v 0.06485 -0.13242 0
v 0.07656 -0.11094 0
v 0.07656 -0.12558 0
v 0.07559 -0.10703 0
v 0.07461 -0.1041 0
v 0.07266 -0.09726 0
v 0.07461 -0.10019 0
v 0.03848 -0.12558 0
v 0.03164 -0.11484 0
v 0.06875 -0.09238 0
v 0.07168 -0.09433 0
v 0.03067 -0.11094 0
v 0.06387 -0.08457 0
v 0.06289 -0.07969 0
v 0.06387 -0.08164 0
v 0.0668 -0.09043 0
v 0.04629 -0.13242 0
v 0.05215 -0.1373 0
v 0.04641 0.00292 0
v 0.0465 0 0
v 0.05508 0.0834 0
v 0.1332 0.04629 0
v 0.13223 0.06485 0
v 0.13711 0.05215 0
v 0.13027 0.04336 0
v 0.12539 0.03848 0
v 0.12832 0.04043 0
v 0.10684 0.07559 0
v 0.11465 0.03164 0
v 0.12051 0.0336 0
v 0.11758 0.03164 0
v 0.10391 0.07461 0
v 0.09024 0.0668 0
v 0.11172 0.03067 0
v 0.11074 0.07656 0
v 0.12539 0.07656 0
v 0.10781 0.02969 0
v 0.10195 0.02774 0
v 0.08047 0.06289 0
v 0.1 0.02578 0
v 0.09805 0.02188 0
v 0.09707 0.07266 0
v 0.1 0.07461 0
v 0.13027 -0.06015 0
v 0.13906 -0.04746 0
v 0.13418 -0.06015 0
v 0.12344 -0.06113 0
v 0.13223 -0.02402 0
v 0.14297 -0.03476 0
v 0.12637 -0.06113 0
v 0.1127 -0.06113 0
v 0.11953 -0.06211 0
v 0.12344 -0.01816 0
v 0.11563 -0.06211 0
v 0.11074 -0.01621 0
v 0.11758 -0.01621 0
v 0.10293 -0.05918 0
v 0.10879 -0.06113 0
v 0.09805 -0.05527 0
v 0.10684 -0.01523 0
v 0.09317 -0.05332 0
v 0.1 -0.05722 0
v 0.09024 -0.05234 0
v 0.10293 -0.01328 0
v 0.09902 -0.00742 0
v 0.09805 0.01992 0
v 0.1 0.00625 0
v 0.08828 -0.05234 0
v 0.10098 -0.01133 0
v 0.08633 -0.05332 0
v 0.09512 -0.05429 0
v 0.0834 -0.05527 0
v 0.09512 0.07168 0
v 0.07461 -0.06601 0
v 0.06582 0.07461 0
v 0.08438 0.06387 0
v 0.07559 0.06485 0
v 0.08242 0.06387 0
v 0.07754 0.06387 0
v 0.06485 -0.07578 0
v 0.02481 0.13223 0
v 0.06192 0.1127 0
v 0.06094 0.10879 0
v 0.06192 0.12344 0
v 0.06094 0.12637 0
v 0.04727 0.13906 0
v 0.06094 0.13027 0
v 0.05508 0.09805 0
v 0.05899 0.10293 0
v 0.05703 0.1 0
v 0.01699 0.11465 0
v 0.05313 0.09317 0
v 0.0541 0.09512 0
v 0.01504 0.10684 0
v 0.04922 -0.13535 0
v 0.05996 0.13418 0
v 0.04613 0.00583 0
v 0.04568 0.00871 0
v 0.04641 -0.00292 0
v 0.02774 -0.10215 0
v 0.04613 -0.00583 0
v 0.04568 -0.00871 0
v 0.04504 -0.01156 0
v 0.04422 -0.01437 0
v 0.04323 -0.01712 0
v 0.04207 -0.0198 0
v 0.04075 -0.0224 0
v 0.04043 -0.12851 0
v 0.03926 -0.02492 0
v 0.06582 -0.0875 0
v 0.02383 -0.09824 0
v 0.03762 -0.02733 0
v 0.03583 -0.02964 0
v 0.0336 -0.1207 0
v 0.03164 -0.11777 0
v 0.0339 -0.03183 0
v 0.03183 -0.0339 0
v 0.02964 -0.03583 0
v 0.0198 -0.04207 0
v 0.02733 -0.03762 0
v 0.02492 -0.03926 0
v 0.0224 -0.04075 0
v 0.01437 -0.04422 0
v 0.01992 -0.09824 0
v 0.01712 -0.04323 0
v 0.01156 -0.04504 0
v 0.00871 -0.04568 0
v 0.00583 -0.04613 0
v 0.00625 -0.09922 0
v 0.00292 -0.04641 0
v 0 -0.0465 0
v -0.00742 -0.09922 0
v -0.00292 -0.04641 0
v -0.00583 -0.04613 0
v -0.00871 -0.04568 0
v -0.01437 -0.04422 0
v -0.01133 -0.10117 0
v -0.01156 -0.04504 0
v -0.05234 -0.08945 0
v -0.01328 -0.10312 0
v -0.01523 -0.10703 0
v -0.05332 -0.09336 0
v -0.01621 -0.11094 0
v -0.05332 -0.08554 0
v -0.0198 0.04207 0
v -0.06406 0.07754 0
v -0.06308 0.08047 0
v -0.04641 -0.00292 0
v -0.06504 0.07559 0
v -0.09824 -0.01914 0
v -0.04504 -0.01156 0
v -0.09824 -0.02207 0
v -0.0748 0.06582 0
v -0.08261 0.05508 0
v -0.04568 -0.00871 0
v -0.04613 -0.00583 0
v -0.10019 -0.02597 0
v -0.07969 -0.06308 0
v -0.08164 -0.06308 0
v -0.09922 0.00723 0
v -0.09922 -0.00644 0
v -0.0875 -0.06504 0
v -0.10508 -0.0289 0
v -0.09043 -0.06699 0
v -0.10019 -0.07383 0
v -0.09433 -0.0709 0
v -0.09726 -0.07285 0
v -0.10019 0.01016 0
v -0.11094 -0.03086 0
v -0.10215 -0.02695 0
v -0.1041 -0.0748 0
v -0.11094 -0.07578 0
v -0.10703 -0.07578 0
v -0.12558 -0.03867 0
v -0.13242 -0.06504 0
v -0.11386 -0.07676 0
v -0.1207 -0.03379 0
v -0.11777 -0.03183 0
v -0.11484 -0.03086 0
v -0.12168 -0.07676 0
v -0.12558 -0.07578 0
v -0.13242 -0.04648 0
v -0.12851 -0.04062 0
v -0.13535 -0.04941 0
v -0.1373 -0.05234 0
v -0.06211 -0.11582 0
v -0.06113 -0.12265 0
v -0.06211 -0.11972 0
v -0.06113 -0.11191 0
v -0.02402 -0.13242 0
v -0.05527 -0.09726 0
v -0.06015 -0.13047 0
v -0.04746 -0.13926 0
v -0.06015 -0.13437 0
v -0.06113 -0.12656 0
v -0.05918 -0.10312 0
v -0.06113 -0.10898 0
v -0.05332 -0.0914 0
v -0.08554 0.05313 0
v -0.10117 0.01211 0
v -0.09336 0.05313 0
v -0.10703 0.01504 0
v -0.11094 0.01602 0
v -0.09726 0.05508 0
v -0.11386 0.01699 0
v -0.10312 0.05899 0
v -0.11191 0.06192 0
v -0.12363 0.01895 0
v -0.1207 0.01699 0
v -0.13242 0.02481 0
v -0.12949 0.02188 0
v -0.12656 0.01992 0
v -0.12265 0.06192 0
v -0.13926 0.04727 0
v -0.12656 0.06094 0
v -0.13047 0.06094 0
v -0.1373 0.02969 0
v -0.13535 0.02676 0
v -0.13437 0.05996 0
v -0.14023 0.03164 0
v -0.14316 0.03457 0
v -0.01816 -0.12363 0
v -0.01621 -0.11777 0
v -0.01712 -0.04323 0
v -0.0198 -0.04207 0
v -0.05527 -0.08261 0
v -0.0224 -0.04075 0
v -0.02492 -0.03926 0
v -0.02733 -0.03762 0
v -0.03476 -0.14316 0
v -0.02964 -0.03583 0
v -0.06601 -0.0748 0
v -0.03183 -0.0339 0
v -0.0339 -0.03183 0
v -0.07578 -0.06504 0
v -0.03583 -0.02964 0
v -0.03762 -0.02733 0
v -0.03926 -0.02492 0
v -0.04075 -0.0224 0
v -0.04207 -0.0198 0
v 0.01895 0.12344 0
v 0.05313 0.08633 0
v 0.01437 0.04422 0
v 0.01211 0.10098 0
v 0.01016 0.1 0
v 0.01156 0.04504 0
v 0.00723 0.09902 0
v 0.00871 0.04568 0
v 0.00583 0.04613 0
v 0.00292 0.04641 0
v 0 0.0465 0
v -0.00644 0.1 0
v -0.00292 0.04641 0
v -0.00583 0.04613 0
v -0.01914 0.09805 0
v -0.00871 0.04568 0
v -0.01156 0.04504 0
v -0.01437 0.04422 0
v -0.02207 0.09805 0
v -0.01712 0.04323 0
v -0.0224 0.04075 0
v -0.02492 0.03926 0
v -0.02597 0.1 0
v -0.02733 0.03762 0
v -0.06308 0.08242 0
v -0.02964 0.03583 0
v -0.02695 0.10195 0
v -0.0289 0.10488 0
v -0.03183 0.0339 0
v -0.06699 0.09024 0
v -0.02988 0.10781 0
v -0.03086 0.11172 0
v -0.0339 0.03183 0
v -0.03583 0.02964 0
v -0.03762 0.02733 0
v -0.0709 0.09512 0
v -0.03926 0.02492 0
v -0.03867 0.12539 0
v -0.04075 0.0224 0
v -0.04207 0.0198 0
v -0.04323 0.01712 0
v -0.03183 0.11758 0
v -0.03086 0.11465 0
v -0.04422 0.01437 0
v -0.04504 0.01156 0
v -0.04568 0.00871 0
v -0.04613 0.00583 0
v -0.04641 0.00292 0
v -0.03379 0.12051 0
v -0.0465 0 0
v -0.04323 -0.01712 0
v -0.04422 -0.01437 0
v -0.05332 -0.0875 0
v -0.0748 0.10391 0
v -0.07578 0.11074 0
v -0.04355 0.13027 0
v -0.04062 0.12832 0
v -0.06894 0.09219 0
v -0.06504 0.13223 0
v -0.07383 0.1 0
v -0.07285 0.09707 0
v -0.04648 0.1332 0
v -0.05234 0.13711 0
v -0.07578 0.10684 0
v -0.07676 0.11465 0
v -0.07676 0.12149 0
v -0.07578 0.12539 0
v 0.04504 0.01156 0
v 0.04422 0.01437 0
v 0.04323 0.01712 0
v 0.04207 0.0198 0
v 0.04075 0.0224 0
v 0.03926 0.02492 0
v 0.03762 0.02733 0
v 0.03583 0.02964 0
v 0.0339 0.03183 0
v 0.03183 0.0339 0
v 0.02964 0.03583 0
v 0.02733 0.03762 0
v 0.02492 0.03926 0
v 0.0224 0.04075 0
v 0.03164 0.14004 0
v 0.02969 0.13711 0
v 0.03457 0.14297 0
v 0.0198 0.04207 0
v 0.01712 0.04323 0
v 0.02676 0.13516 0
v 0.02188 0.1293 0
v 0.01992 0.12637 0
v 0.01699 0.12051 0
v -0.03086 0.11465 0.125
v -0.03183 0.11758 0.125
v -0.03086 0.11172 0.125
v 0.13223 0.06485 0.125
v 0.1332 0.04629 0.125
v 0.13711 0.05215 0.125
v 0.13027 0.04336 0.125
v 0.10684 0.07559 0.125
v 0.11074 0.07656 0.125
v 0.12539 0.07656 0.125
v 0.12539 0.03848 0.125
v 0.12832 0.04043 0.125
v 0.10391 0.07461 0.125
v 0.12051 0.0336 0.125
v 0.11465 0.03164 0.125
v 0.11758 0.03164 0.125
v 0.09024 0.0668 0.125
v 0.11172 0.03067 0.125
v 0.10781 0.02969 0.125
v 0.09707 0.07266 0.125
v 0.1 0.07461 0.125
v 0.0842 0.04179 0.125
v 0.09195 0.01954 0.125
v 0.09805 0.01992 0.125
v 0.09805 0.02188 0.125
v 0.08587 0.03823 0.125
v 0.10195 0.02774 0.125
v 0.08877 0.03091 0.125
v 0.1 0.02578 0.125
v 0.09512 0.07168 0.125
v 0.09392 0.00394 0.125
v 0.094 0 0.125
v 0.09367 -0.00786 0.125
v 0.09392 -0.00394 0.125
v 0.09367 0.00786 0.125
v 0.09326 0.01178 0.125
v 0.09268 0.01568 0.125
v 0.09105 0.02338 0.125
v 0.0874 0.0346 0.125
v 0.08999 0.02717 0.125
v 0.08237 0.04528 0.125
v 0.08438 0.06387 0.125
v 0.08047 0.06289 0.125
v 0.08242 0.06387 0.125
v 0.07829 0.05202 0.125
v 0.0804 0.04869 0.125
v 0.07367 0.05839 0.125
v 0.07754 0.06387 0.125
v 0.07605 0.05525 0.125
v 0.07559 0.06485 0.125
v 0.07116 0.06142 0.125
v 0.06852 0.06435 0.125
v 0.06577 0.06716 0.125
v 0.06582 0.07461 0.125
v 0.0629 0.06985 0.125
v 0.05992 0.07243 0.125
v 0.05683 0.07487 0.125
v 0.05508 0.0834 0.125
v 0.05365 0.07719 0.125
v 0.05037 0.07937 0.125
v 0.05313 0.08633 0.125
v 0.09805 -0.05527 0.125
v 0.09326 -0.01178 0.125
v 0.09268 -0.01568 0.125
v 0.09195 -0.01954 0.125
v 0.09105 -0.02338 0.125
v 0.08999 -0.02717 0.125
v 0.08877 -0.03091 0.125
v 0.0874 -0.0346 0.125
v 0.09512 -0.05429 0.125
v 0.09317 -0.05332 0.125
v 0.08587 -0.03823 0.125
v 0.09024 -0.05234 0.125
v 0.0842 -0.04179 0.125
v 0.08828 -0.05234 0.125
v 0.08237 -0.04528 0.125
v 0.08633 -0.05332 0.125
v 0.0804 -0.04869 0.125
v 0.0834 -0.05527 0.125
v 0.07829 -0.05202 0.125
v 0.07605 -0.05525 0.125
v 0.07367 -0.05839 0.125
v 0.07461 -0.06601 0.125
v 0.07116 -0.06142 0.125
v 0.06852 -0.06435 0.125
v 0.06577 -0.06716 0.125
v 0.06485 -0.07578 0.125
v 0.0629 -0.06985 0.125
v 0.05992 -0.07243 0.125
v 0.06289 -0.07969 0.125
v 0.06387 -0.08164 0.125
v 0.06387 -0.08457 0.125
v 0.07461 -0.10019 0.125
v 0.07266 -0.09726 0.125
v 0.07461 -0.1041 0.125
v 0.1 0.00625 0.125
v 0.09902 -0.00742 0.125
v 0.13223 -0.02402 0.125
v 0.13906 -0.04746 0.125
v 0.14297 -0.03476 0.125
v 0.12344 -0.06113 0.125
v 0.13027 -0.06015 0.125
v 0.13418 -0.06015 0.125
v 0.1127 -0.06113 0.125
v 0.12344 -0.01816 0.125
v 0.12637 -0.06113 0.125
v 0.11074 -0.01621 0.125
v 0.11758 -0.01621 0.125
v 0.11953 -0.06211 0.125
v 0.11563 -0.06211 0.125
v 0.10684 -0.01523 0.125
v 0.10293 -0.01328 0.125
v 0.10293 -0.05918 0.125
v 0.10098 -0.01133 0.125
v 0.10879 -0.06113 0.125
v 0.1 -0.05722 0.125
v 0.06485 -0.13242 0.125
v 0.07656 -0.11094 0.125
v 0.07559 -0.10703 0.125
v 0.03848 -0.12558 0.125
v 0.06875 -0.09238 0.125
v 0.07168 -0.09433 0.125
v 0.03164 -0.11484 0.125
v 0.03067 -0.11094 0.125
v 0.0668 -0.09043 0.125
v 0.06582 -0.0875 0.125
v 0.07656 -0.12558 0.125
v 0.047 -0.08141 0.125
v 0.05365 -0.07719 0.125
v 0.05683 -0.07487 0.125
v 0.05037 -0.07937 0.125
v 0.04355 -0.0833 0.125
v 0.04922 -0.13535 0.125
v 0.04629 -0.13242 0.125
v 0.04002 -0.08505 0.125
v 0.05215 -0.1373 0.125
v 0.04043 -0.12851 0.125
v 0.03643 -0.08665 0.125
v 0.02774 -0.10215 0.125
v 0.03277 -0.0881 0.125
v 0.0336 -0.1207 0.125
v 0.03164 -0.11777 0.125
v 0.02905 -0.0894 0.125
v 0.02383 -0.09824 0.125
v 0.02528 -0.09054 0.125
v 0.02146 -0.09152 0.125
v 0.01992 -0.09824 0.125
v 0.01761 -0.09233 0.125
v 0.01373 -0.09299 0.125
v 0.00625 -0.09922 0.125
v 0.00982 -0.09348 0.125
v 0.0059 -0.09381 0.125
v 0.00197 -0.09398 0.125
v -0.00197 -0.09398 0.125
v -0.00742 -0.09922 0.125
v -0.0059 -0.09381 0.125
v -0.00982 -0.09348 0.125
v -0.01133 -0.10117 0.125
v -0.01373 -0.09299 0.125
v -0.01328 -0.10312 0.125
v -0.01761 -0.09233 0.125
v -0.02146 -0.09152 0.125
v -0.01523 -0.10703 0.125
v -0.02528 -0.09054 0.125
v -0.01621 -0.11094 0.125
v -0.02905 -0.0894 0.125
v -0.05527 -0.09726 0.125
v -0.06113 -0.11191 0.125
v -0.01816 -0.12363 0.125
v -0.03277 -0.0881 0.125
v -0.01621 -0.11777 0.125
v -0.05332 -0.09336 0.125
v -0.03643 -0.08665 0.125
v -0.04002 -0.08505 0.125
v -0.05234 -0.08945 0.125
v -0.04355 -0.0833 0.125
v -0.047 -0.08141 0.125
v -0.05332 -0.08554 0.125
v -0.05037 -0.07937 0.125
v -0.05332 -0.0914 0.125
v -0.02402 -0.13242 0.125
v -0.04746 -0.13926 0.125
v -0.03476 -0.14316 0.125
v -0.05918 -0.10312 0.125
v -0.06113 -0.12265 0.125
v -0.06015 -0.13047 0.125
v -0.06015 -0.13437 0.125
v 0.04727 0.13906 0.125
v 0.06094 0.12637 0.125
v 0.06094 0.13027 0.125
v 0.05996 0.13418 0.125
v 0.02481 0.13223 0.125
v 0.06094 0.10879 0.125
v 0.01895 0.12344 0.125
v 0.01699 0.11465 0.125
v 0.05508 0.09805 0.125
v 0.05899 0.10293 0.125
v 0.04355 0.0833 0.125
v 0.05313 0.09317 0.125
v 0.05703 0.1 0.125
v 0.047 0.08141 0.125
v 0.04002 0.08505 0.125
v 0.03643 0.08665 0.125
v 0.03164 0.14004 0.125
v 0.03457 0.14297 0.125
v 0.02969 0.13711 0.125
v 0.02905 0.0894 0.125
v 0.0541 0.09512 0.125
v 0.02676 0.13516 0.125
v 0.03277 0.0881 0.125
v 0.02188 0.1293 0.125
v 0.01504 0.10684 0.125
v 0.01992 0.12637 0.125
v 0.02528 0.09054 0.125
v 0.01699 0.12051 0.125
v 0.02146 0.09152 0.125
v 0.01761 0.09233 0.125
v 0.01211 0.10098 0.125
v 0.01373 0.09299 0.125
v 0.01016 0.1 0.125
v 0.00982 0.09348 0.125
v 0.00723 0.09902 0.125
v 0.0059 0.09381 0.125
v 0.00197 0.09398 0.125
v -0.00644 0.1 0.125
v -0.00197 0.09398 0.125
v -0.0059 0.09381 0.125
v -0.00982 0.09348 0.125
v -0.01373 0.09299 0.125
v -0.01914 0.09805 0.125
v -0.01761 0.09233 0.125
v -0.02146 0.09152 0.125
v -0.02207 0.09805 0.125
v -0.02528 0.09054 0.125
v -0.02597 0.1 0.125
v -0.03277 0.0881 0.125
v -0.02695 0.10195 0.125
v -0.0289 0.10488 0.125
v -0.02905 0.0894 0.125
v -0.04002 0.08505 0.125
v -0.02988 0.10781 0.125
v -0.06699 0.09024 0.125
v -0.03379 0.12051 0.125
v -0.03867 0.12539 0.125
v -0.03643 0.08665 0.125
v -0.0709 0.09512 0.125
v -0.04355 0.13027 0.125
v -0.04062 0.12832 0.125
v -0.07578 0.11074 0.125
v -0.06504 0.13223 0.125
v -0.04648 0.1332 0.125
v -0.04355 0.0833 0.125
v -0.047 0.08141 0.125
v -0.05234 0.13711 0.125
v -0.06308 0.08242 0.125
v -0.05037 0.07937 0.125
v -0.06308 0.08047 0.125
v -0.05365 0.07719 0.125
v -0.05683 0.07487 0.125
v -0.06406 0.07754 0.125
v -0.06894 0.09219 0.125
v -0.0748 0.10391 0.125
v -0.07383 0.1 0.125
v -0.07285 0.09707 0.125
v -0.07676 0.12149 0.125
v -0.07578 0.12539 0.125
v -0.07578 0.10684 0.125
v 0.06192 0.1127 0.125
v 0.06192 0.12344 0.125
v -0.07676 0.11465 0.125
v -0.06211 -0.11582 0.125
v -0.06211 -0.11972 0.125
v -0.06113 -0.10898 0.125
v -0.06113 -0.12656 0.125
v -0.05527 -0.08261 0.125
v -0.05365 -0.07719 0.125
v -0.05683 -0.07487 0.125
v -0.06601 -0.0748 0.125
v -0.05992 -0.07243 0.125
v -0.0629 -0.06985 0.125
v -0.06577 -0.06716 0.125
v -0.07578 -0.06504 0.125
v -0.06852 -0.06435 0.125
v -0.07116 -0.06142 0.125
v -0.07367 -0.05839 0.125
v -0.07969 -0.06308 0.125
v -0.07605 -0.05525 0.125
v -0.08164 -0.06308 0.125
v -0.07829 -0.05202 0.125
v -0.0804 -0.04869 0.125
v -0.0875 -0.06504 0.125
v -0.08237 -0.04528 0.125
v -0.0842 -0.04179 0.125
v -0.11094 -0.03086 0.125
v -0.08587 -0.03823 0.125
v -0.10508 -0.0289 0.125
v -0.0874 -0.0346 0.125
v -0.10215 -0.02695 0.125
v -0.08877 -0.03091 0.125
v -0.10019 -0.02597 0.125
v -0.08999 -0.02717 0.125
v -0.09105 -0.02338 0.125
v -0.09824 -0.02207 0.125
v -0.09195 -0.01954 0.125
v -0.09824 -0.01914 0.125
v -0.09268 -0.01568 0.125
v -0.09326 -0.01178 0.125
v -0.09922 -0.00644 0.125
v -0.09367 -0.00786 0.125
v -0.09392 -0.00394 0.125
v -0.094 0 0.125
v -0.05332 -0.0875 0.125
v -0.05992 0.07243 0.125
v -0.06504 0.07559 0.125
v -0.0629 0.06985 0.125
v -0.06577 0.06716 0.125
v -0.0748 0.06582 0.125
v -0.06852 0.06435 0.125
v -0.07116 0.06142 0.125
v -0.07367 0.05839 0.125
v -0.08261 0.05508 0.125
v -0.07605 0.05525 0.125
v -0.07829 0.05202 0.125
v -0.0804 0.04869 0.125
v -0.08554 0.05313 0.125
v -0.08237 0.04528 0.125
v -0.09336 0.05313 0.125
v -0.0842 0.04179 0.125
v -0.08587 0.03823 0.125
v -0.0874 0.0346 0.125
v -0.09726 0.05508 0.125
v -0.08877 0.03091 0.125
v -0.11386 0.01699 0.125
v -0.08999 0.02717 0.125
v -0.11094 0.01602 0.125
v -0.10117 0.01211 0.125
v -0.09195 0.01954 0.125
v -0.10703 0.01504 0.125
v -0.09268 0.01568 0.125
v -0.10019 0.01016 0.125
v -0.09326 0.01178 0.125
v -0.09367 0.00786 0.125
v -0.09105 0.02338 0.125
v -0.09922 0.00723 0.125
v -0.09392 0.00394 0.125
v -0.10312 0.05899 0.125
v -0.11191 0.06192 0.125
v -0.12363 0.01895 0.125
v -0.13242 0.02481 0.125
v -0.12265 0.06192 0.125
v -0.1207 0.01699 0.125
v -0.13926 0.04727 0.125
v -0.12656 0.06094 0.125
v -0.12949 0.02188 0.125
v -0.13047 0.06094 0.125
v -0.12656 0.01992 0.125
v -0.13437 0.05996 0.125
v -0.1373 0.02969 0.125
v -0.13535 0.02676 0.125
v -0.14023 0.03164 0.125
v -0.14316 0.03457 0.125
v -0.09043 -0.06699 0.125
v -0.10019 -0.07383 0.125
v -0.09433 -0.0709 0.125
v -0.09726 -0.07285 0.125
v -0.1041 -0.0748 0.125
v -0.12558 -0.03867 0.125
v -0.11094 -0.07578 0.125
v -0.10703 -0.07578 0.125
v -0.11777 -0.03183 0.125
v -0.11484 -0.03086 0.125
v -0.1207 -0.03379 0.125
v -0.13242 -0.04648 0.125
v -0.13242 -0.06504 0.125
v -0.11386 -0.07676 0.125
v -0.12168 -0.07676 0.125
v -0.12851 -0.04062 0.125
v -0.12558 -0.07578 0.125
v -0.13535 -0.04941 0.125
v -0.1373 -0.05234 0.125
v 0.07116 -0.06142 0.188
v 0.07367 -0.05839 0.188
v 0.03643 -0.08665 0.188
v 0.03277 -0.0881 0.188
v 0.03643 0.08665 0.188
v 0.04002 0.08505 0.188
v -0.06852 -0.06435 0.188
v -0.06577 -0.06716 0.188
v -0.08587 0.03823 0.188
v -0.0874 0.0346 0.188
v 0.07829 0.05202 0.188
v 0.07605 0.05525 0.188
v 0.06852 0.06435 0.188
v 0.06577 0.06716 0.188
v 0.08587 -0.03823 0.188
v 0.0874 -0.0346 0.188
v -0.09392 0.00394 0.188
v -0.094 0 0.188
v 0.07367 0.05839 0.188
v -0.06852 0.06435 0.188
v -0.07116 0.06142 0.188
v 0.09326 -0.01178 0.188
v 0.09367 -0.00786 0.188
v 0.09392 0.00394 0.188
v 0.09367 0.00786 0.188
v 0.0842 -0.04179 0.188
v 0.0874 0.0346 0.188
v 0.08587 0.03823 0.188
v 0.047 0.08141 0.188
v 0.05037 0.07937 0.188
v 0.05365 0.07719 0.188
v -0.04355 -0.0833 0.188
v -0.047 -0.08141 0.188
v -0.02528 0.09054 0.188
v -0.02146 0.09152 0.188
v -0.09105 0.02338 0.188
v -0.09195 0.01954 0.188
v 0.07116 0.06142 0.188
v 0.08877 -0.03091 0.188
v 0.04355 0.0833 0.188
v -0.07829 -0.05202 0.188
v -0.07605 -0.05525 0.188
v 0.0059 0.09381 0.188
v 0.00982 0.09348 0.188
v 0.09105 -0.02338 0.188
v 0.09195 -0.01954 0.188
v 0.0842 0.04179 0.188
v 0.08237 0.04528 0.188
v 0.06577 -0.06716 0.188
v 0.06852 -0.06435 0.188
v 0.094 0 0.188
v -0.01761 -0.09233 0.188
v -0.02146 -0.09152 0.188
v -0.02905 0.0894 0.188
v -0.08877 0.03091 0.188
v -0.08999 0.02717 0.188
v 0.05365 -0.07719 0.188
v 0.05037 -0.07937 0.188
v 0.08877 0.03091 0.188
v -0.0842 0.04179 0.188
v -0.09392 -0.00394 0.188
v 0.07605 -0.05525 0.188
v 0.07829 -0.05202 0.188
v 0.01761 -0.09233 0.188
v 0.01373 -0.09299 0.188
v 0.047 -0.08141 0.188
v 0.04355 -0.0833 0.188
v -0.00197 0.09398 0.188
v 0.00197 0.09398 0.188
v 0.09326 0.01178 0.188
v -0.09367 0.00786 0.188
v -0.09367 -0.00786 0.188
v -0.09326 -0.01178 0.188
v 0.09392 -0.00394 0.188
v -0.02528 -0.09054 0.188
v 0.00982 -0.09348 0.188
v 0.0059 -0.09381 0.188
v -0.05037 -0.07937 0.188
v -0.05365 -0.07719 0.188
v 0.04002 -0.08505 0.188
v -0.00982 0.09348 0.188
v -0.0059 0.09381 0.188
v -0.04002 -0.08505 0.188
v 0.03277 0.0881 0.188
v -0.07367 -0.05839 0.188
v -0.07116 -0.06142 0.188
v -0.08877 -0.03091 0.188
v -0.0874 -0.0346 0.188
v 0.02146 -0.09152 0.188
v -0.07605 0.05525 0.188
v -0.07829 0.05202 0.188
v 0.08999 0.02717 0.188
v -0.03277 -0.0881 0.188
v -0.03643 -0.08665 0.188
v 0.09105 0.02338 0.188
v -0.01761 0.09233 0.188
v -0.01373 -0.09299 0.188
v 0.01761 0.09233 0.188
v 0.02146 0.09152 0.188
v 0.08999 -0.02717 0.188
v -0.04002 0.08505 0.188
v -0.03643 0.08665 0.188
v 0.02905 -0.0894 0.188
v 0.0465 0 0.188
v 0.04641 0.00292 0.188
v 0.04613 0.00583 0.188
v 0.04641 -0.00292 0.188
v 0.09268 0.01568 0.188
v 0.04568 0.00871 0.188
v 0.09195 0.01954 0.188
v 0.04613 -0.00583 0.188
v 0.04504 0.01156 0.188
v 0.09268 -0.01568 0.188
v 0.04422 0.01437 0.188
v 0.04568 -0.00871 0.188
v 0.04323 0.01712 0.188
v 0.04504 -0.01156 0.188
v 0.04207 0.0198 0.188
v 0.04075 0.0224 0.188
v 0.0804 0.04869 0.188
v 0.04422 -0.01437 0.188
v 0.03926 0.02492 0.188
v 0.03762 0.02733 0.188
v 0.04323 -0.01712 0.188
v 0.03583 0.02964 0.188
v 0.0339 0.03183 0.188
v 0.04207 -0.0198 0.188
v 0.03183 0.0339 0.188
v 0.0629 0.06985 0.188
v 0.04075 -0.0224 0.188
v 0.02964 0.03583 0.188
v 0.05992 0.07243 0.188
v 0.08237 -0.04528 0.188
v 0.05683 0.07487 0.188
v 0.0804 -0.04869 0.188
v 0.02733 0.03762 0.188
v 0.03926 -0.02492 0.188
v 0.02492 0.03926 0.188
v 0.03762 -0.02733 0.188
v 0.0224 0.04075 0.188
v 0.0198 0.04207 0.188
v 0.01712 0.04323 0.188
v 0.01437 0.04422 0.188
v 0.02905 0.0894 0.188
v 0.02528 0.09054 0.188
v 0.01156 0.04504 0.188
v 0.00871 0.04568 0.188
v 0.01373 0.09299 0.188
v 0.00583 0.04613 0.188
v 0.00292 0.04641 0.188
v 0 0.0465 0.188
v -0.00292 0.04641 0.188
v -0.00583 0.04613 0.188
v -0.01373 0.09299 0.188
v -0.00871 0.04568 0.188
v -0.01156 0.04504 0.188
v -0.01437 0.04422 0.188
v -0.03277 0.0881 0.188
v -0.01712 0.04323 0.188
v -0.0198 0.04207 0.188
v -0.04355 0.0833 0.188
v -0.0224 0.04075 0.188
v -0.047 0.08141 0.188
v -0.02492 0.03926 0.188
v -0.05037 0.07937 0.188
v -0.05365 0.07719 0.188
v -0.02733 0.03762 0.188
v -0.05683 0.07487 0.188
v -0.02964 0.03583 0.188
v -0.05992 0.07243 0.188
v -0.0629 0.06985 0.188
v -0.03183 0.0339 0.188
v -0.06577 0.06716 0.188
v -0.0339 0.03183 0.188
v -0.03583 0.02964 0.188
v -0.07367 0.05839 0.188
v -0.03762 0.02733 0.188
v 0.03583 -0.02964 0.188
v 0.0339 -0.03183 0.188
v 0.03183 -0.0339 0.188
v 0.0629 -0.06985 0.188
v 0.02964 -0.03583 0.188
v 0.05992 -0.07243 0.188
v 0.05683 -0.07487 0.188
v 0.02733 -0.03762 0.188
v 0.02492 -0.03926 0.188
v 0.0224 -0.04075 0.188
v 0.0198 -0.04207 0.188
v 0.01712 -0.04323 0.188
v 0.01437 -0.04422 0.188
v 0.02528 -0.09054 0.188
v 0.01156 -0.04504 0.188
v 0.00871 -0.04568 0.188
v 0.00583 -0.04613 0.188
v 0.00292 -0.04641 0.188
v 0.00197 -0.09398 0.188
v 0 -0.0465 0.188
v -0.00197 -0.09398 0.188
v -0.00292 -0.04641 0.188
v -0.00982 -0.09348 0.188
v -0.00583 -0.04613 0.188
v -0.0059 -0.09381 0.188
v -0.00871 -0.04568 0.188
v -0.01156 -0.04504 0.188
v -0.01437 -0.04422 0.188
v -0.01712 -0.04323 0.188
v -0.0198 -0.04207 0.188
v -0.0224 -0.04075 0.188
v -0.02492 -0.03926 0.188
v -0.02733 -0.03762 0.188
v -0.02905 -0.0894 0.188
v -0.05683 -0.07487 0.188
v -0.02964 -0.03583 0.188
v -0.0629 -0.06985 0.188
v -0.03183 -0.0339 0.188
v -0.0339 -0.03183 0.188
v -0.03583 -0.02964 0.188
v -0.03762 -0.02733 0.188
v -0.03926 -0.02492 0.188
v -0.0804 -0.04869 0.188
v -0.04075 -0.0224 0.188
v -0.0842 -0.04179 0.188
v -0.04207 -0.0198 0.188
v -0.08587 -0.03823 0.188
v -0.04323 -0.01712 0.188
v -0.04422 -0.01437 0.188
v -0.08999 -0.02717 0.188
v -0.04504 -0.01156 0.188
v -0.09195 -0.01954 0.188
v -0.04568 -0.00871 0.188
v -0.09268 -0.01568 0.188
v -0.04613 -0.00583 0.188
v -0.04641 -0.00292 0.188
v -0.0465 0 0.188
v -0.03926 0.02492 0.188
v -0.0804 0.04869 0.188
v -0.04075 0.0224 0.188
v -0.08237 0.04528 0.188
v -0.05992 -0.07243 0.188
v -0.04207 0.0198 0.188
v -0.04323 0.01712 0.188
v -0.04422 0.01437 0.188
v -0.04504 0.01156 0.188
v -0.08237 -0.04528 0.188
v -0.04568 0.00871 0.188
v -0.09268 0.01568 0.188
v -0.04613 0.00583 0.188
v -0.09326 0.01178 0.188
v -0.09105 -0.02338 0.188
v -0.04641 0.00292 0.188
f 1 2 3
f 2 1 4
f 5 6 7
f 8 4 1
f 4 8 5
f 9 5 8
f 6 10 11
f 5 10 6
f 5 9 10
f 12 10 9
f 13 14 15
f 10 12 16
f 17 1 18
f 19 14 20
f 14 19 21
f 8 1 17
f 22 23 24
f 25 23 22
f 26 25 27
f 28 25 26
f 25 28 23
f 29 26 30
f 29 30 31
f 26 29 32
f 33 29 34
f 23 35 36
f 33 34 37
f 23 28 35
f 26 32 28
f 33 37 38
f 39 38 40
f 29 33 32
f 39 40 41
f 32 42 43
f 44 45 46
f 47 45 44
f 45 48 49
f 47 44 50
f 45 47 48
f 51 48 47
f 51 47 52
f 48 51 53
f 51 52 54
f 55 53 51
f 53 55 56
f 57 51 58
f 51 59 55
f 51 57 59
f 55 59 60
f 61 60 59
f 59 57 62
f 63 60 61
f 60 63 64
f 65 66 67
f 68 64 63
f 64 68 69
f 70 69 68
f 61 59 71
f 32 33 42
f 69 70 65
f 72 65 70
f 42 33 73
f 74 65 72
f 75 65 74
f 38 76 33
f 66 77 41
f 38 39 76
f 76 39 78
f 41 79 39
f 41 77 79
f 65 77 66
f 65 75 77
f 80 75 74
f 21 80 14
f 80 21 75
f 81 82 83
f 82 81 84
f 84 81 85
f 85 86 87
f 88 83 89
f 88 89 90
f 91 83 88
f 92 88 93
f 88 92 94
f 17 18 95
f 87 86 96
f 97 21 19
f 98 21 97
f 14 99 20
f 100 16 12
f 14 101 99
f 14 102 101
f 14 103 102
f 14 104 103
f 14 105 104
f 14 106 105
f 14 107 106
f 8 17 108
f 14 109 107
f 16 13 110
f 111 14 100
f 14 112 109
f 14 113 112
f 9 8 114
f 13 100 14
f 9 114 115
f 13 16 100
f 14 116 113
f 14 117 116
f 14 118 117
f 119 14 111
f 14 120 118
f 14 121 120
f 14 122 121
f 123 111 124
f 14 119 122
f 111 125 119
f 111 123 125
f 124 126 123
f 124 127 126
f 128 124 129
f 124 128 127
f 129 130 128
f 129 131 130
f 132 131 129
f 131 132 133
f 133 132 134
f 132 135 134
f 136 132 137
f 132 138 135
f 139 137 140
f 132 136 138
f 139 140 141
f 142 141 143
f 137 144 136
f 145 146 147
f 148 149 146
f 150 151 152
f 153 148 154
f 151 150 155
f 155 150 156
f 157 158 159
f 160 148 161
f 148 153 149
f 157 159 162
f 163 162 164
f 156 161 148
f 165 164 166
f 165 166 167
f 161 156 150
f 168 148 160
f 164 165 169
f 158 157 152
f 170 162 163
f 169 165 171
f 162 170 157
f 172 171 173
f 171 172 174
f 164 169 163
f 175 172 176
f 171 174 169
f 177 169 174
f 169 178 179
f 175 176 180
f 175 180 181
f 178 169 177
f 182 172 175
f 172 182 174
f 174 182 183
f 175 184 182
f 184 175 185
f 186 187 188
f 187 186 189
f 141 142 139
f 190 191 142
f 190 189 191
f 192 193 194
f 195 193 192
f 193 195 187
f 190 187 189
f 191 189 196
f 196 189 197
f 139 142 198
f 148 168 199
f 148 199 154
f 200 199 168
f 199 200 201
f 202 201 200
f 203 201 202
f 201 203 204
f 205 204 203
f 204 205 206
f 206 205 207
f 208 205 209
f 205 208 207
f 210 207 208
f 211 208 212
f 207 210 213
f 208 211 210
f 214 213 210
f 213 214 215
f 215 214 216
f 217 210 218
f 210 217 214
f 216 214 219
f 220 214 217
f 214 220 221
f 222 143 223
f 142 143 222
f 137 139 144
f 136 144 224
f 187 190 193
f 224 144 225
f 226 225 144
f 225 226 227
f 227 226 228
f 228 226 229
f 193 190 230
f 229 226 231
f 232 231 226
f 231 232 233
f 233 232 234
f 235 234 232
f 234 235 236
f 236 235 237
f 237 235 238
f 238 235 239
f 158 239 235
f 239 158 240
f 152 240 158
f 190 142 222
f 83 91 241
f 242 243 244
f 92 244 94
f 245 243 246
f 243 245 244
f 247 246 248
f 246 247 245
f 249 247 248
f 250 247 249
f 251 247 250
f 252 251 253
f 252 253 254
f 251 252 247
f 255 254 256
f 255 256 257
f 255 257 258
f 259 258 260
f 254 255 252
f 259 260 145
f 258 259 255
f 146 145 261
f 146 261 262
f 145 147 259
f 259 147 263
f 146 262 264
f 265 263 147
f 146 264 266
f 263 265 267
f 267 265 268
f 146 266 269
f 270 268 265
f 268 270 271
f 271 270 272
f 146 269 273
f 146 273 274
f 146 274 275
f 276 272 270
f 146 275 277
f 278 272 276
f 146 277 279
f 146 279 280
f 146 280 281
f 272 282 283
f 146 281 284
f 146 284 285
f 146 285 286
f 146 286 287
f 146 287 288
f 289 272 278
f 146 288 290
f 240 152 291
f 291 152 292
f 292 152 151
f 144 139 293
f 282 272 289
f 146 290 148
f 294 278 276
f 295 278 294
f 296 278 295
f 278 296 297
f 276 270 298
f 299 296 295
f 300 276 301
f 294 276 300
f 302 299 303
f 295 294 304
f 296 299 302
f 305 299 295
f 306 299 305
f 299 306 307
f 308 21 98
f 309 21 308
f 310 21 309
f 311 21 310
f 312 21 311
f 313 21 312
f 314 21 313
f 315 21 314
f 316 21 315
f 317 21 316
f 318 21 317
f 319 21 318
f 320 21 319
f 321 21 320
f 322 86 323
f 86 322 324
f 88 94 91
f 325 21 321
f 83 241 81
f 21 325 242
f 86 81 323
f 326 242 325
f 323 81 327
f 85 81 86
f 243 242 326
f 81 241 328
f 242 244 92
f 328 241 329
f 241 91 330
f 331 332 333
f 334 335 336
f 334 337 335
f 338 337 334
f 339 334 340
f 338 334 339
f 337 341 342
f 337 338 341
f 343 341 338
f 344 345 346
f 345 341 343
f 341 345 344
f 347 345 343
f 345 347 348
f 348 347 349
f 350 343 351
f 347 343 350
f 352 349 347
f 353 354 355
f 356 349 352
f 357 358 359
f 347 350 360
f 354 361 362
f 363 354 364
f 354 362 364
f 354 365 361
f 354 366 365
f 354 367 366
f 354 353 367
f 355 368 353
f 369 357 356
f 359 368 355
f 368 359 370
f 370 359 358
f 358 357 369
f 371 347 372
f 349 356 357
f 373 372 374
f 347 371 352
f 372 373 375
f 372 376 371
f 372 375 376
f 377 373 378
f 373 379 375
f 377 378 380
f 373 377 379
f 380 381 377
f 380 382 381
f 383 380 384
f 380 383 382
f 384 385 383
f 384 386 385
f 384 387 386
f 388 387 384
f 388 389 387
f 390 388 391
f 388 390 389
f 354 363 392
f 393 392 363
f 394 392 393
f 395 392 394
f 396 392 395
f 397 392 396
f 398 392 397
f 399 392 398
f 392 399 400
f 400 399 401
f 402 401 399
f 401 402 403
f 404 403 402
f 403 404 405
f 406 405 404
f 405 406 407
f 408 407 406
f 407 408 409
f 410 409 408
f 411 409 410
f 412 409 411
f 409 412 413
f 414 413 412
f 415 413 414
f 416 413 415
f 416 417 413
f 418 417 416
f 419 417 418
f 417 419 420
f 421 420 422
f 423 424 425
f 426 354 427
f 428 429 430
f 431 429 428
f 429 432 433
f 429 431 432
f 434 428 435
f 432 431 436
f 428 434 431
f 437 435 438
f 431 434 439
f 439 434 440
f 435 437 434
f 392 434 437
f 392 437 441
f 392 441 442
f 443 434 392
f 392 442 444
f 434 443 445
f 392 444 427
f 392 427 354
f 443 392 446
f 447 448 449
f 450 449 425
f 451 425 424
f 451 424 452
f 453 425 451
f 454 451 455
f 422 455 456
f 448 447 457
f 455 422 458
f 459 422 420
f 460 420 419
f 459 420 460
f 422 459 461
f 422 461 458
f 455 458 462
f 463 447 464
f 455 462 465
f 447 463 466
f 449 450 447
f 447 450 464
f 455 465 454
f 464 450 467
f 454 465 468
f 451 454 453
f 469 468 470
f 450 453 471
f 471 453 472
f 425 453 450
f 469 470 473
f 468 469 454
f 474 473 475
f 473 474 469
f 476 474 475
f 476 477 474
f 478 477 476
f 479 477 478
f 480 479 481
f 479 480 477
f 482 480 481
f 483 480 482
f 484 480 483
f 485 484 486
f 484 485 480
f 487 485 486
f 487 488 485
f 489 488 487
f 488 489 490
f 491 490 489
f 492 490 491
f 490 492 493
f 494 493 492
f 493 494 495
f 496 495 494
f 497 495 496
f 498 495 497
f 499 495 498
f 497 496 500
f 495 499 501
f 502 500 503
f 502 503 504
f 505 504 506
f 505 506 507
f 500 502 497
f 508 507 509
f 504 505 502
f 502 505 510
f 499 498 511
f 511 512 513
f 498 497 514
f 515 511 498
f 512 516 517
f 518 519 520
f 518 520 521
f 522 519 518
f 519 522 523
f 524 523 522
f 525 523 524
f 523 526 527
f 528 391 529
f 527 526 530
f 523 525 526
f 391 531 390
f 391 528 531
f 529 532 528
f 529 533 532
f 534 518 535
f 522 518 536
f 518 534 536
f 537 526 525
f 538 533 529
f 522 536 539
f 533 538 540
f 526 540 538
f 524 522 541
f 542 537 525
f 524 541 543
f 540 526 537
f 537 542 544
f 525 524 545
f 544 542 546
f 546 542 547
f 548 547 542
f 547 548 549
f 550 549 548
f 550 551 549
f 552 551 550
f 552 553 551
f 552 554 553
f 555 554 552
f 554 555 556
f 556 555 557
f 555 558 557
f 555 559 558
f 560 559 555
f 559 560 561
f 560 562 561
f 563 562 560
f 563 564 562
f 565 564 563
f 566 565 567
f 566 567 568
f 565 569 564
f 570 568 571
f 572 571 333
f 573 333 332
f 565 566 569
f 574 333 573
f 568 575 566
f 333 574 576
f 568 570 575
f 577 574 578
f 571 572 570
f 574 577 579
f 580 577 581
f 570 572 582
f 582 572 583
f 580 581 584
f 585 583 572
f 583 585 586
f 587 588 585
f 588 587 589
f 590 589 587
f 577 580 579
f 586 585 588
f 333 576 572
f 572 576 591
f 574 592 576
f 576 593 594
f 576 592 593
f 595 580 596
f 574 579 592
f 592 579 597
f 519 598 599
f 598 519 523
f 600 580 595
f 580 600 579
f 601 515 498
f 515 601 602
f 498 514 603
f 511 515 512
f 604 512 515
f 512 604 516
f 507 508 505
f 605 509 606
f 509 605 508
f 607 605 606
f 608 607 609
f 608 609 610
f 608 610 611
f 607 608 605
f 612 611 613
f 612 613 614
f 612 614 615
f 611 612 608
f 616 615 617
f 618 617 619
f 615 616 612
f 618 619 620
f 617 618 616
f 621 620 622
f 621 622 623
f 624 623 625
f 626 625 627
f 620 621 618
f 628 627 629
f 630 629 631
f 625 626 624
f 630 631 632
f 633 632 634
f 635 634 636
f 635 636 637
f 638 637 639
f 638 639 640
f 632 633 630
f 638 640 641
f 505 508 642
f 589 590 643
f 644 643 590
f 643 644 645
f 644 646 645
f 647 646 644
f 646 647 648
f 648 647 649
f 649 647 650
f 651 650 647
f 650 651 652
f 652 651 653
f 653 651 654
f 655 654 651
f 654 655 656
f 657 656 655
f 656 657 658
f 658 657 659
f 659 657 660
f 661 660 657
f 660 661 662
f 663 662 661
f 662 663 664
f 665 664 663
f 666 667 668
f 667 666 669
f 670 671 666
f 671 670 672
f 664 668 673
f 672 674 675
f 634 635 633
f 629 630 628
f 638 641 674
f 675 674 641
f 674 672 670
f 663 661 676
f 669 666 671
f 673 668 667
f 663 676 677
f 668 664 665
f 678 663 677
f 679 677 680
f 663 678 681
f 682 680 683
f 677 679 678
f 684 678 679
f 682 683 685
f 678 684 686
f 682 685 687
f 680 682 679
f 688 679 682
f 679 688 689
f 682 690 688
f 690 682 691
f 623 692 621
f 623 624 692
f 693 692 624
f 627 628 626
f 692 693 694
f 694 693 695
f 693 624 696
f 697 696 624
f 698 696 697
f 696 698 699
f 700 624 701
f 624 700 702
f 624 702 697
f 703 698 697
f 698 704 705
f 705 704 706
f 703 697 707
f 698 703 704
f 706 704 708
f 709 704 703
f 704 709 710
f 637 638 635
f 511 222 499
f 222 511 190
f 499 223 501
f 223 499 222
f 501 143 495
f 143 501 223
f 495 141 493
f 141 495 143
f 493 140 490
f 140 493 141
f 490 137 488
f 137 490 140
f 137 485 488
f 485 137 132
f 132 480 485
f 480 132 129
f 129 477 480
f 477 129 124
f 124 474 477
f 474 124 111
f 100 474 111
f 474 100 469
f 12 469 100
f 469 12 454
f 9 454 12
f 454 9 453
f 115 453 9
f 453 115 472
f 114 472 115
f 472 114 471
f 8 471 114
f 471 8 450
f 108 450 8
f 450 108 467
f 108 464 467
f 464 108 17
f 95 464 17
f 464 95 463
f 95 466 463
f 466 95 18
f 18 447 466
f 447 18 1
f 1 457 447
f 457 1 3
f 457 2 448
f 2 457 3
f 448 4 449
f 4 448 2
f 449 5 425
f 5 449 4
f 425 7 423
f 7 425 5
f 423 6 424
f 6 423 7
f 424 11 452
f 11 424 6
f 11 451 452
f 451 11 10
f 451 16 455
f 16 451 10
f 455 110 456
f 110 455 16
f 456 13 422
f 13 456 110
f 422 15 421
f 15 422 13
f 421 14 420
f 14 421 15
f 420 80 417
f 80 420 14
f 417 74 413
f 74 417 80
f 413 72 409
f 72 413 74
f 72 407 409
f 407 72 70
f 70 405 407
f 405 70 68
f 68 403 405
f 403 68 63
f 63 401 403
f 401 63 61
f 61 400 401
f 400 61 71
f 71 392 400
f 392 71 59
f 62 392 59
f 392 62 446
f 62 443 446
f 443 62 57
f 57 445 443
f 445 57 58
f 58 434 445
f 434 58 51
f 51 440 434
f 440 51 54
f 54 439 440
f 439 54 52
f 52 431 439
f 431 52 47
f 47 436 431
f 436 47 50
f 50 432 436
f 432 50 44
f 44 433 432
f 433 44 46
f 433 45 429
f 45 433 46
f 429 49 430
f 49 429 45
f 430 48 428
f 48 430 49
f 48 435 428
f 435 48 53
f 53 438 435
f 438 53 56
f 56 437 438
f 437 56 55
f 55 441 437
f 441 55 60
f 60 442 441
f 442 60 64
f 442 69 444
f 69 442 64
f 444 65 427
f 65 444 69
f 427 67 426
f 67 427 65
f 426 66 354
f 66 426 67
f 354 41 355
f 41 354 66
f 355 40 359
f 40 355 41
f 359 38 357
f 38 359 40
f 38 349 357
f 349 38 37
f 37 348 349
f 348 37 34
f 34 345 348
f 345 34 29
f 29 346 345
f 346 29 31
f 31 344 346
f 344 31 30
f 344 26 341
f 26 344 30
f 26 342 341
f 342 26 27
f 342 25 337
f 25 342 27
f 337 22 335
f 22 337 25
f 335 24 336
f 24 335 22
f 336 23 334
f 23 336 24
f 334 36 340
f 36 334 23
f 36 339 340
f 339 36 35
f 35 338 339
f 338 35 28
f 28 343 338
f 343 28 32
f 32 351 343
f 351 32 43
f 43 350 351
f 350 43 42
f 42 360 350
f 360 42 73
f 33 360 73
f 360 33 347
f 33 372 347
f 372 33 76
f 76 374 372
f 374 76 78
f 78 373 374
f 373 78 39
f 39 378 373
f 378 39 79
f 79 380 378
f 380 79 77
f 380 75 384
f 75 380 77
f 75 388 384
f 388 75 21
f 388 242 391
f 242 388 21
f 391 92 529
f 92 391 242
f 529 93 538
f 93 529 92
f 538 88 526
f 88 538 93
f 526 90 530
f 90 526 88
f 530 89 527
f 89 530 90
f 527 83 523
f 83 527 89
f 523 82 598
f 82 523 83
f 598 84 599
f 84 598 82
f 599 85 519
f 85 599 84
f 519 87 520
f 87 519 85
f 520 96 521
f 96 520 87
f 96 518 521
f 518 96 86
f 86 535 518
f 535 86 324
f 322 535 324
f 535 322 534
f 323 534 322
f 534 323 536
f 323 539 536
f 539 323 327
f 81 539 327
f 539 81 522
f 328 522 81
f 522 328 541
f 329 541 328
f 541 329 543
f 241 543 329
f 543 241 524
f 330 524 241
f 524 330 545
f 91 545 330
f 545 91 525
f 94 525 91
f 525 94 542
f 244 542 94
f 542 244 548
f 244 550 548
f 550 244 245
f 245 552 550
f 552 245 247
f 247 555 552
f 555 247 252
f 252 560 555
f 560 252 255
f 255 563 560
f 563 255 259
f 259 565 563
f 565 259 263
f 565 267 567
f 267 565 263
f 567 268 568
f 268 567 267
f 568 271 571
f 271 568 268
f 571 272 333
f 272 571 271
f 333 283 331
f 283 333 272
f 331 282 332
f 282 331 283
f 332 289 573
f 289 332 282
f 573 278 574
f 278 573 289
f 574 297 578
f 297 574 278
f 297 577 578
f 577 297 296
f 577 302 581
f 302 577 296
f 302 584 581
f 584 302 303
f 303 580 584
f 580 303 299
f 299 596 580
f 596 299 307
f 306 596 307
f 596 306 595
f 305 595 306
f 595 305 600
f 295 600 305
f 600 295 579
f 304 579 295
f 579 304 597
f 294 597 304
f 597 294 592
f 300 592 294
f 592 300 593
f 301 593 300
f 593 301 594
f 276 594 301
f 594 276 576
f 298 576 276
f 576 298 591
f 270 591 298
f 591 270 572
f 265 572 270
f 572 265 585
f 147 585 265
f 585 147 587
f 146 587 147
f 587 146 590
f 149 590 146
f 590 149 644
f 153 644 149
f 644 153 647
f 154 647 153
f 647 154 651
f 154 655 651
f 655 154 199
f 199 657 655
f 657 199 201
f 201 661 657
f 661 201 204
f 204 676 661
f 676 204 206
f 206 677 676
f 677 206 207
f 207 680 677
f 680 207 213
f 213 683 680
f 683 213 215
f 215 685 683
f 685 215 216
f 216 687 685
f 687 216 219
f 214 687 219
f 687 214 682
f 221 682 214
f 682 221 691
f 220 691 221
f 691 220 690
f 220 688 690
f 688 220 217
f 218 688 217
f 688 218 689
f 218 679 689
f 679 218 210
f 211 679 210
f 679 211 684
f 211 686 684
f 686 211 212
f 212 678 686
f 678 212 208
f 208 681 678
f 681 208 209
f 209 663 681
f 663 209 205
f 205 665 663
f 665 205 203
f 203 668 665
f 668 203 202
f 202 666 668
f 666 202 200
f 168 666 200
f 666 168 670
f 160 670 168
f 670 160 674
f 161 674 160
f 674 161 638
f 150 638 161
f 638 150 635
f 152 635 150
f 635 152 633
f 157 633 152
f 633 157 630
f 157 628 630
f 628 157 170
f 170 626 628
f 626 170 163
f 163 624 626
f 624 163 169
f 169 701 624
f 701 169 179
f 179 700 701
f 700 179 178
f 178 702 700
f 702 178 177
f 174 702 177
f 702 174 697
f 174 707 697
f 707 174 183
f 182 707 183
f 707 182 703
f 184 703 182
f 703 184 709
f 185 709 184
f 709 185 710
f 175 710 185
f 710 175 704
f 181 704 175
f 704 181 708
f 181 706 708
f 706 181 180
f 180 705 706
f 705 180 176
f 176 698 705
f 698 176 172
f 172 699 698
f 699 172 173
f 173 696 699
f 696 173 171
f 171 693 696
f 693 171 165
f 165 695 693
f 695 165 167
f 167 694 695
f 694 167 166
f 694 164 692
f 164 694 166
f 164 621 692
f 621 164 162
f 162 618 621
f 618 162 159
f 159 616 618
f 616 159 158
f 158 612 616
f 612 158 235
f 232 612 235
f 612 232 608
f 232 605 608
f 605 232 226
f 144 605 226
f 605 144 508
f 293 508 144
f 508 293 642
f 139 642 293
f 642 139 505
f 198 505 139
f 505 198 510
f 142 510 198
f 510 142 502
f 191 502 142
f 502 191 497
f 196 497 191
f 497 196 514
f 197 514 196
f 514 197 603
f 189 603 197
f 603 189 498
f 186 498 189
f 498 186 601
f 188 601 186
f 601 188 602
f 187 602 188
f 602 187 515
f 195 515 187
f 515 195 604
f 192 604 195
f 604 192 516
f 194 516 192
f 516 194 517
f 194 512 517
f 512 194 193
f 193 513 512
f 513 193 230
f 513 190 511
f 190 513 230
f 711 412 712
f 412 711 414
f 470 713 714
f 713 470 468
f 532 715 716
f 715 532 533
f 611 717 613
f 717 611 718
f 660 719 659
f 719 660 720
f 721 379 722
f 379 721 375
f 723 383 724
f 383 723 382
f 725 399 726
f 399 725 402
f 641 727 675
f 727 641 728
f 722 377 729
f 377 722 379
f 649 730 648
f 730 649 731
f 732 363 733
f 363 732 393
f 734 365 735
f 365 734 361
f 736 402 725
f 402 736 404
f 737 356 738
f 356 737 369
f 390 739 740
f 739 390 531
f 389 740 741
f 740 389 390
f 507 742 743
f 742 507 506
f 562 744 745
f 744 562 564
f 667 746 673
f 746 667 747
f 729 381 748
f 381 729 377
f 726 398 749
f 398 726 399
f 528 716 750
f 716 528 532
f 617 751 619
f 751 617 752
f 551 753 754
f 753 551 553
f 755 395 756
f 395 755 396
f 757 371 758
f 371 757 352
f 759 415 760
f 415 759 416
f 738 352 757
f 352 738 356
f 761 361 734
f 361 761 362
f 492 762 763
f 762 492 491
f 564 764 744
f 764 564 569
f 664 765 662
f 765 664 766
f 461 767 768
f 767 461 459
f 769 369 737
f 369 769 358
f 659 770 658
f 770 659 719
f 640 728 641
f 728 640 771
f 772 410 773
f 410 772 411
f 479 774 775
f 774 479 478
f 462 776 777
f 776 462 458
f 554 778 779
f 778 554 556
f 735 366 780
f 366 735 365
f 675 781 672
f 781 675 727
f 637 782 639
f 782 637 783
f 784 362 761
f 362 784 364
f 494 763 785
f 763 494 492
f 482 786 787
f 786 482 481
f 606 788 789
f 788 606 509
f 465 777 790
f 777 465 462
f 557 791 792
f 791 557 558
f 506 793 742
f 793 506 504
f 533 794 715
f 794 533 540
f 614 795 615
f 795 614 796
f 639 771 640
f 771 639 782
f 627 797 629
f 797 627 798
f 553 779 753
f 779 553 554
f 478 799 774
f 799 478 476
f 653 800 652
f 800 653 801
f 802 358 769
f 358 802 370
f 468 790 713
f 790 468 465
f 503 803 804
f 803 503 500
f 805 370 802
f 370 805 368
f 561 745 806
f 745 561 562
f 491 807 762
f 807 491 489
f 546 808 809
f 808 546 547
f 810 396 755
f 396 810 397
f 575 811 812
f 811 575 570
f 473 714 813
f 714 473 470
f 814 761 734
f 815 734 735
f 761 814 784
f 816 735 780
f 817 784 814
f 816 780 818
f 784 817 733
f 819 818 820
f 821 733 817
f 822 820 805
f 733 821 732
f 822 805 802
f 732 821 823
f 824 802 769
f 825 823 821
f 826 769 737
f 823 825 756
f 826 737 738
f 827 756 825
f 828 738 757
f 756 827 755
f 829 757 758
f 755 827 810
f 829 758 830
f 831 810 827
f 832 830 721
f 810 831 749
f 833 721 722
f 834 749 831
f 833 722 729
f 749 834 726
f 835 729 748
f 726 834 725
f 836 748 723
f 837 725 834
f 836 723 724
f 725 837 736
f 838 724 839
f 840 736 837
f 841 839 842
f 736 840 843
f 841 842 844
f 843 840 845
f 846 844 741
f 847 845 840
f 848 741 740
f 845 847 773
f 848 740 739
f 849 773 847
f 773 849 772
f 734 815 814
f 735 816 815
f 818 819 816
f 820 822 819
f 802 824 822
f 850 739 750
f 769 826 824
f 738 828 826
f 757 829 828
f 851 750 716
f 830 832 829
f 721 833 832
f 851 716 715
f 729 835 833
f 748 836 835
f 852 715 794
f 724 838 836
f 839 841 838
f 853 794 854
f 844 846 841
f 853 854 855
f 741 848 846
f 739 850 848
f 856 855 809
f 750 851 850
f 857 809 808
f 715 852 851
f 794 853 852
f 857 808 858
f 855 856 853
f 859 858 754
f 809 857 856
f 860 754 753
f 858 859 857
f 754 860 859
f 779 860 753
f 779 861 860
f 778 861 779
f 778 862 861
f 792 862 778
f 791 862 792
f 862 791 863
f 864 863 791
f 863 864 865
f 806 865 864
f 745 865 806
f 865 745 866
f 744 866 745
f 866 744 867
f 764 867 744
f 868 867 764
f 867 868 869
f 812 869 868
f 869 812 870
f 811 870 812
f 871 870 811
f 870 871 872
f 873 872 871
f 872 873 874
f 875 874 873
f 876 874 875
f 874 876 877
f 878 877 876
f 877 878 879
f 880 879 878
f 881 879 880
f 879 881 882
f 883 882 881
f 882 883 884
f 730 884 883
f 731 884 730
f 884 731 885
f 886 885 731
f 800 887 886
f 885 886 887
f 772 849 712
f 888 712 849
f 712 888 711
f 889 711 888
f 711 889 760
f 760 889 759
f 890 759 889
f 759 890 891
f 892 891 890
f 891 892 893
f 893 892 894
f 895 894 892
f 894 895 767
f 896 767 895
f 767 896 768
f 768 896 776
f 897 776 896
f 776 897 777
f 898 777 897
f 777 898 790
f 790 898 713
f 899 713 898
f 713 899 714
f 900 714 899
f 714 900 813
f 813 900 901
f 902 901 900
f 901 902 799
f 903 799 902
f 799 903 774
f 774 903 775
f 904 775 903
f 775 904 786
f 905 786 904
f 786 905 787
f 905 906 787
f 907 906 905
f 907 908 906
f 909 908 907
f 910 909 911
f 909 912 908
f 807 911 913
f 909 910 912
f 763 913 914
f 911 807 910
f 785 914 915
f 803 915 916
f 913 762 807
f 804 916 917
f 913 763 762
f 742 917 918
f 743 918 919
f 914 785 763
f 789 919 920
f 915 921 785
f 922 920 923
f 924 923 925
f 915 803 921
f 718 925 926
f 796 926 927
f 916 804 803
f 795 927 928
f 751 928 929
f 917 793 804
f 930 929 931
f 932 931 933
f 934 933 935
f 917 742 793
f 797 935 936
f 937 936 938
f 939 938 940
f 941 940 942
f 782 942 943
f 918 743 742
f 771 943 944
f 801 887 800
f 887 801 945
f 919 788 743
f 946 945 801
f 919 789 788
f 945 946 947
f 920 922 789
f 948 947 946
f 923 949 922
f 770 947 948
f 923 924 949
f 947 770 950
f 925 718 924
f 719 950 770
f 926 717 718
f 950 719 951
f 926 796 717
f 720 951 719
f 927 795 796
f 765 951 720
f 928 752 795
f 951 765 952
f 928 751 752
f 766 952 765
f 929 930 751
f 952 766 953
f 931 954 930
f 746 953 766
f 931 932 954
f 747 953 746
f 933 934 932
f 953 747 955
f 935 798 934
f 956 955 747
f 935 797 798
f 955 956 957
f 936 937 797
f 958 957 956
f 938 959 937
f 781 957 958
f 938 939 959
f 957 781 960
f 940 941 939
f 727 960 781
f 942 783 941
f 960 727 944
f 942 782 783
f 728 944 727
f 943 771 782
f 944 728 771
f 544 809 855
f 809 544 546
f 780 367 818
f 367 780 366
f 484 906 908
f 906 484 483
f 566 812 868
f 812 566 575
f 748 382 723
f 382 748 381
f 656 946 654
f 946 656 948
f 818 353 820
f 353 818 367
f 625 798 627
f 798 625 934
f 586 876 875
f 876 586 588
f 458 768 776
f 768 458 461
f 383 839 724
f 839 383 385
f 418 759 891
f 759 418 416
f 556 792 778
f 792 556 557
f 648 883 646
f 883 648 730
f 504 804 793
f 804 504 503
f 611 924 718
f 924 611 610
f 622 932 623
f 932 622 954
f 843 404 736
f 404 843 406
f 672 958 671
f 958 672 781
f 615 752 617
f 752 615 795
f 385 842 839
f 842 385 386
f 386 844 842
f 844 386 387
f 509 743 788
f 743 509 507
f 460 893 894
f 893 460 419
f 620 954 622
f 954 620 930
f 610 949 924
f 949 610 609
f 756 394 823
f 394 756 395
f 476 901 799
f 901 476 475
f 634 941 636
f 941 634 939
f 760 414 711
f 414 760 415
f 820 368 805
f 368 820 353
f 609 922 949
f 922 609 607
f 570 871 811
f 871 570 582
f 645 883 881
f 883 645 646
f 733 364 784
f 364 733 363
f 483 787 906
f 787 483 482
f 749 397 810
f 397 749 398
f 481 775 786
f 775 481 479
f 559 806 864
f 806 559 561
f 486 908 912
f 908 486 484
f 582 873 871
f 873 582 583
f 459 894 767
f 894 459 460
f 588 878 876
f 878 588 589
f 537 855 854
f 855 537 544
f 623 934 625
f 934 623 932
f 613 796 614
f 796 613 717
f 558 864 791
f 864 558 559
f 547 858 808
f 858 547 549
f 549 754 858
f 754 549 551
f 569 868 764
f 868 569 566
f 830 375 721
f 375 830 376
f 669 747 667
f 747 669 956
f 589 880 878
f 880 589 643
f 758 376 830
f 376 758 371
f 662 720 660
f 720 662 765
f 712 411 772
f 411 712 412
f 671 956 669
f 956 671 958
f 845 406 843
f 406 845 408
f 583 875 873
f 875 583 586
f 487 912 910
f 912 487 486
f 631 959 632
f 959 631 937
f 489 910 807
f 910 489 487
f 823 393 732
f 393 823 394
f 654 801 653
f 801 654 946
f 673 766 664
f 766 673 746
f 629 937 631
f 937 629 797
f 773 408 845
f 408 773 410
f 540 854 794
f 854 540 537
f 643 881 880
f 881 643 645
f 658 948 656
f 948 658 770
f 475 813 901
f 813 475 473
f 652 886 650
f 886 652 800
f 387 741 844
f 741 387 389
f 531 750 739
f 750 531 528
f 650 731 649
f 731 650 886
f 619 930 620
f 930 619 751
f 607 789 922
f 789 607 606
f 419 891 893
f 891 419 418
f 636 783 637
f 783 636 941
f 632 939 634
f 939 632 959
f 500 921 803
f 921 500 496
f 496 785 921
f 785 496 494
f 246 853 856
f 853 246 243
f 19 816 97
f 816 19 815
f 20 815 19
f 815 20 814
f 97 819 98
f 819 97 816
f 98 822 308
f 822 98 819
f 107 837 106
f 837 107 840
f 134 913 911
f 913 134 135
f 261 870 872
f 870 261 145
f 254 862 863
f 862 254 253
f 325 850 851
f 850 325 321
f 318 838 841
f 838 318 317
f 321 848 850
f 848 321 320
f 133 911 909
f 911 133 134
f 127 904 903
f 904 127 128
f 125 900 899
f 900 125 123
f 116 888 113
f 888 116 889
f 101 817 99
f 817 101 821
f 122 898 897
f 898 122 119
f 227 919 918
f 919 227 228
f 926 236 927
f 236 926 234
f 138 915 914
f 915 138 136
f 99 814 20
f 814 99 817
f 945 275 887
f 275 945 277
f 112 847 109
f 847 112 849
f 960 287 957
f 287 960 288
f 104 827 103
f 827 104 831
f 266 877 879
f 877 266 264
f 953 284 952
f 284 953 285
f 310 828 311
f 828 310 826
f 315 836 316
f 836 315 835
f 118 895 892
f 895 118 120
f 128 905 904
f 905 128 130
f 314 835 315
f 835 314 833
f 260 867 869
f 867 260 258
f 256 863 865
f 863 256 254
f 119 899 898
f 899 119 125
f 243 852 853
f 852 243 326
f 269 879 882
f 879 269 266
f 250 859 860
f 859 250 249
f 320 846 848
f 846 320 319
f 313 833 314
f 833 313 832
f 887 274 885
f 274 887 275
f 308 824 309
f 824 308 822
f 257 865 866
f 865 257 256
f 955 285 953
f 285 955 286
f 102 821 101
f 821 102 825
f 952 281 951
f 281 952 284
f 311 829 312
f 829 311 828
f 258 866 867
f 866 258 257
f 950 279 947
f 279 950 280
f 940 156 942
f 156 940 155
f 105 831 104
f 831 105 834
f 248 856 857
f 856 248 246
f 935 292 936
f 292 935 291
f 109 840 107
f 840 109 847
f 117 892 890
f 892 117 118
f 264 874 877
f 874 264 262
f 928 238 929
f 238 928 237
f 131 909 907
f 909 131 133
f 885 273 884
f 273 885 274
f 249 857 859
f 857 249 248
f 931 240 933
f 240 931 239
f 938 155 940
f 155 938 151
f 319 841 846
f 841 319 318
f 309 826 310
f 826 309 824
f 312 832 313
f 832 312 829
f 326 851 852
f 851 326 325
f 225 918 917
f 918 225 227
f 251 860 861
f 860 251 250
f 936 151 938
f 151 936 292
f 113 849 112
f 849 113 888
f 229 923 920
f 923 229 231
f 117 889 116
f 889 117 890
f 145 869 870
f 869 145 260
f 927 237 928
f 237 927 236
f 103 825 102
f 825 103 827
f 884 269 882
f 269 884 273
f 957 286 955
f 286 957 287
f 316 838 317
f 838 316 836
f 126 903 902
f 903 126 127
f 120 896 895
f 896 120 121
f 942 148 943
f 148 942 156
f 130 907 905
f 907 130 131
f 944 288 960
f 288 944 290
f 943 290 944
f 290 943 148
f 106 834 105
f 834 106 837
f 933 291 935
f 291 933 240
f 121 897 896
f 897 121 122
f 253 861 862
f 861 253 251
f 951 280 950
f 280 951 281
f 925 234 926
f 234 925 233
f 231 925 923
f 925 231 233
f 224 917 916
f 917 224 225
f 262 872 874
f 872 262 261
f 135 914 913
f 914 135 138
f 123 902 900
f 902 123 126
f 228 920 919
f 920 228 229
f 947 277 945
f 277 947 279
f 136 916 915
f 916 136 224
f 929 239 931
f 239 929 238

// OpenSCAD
// Gear8
//
// Tooth spacing 2.500 mm
// Contact angle 20 degrees
// Addendum 0.250 mm
// Diametric pitch 1.257 1/mm
// Pitch diameter 6.366 mm
// Overall diameter 7.470 mm
// Shaft spacing 19.099 mm (to 40 tooth gear)

drawingPositionIN = 40/25.4;

difference() {
  union () {
    // Gear body
    translate([-drawingPositionIN, -drawingPositionIN, 0])
      linear_extrude(height = 0.125, center = false, convexity = 25, slices = 5)
                     import(file = "Gear40and8.dxf", scale = 1/25.4, layer="Gear8");

    // Gear hub
    translate([0, 0, 0])
      cylinder(h = 0.188, d = 0.188, center = false, $fn = 150);
  }

  // idle bar hole
  cylinder(h = 2.0, d = 0.093, center = true, $fn = 100);
}
